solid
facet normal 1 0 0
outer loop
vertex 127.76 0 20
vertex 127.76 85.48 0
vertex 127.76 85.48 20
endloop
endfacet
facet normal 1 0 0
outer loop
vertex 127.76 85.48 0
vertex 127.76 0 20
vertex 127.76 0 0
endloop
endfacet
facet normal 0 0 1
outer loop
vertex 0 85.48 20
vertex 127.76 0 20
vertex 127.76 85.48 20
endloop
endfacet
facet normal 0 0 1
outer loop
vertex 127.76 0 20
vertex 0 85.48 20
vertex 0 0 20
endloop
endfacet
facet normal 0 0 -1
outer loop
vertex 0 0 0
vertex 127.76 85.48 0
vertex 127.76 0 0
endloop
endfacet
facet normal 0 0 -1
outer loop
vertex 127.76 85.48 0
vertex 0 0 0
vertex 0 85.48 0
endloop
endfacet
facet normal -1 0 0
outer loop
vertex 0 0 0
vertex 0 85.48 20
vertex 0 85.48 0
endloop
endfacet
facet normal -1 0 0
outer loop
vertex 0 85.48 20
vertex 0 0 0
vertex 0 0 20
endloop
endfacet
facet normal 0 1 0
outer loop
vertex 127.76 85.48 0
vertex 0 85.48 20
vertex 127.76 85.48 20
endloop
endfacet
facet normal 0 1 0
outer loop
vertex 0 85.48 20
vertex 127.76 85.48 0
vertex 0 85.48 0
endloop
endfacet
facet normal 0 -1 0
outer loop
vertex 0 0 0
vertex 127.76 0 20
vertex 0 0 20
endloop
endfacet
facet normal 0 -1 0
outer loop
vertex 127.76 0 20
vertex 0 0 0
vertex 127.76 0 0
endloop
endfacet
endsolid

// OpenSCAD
// 96-well PCR tube rack (0.2 mL) — ANSI/SLAS microplate footprint
// Print orientation: rests on XY plane (z = 0), builds upward (+Z), centred on origin in X and Y.

// ---- Block dimensions (mm) ----
L = 127.76;   // length along X
W = 85.48;    // width  along Y
H = 20;       // height along Z

// ---- Hole grid ----
n_rows  = 8;  // rows along Y
n_cols  = 12; // columns along X
pitch   = 9.0;    // centre-to-centre spacing (both X and Y)
hole_d  = 6.2;    // hole diameter
hole_r  = hole_d / 2;

// A1 (first hole) offset from the left (X) and back (Y) edges
a1_x = 14.38;
a1_y = 11.24;

// ---- Chamfer (orientation mark at the A1 corner) ----
chamfer_leg = 5;   // 5 mm legs, 45° chamfer on the vertical edge at the A1 corner

// ---- Derived centred coordinates ----
// Block spans x in [-L/2, L/2] and y in [-W/2, W/2]
x0 = -L / 2;  // left edge
y0 = -W / 2;  // back edge

// Hole centre positions (absolute, centred on origin)
hole_x = x0 + a1_x + [0 : n_cols - 1] * pitch;   // 12 columns
hole_y = y0 + a1_y + [0 : n_rows - 1] * pitch;   // 8 rows

// Chamfer corner (the A1 vertical edge) in absolute coordinates
cx = x0 + a1_x;
cy = y0 + a1_y;

// ---- Build ----
$fn = 64;

difference() {
    // Main block
    translate([0, 0, 0])
        cube([L, W, H], center = [true, true, false]);

    // 96 vertical through-holes
    for (hx = hole_x)
        for (hy = hole_y)
            translate([hx, hy, -1])   // extend 1 mm below z=0 so the cut is clean
                cylinder(h = H + 2, r = hole_r, $fn = 64);

    // 45° chamfer (5 mm legs) off the vertical edge at the A1 corner
    // The A1 corner is the vertical edge of the block nearest the A1 hole.
    // We cut a triangular prism that removes a 5 mm x 5 mm corner from that vertical edge.
    // The corner in plan view is at (cx, cy). The block edges meeting there are:
    //   - the left edge  (x = x0)  running along Y
    //   - the back edge  (y = y0)  running along X
    // The chamfer removes the corner between these two edges.
    // In plan view the cut is a right triangle with legs of length chamfer_leg
    // along +X and +Y from the corner point (x0, y0).
    // We model it as a polygon extruded through the full height, extended 1 mm past top and bottom.
    translate([x0, y0, -1])
        linear_extrude(h = H + 2, center = false)
            polygon(points = [
                [0, 0],
                [chamfer_leg, 0],
                [0, chamfer_leg]
            ]);
}
